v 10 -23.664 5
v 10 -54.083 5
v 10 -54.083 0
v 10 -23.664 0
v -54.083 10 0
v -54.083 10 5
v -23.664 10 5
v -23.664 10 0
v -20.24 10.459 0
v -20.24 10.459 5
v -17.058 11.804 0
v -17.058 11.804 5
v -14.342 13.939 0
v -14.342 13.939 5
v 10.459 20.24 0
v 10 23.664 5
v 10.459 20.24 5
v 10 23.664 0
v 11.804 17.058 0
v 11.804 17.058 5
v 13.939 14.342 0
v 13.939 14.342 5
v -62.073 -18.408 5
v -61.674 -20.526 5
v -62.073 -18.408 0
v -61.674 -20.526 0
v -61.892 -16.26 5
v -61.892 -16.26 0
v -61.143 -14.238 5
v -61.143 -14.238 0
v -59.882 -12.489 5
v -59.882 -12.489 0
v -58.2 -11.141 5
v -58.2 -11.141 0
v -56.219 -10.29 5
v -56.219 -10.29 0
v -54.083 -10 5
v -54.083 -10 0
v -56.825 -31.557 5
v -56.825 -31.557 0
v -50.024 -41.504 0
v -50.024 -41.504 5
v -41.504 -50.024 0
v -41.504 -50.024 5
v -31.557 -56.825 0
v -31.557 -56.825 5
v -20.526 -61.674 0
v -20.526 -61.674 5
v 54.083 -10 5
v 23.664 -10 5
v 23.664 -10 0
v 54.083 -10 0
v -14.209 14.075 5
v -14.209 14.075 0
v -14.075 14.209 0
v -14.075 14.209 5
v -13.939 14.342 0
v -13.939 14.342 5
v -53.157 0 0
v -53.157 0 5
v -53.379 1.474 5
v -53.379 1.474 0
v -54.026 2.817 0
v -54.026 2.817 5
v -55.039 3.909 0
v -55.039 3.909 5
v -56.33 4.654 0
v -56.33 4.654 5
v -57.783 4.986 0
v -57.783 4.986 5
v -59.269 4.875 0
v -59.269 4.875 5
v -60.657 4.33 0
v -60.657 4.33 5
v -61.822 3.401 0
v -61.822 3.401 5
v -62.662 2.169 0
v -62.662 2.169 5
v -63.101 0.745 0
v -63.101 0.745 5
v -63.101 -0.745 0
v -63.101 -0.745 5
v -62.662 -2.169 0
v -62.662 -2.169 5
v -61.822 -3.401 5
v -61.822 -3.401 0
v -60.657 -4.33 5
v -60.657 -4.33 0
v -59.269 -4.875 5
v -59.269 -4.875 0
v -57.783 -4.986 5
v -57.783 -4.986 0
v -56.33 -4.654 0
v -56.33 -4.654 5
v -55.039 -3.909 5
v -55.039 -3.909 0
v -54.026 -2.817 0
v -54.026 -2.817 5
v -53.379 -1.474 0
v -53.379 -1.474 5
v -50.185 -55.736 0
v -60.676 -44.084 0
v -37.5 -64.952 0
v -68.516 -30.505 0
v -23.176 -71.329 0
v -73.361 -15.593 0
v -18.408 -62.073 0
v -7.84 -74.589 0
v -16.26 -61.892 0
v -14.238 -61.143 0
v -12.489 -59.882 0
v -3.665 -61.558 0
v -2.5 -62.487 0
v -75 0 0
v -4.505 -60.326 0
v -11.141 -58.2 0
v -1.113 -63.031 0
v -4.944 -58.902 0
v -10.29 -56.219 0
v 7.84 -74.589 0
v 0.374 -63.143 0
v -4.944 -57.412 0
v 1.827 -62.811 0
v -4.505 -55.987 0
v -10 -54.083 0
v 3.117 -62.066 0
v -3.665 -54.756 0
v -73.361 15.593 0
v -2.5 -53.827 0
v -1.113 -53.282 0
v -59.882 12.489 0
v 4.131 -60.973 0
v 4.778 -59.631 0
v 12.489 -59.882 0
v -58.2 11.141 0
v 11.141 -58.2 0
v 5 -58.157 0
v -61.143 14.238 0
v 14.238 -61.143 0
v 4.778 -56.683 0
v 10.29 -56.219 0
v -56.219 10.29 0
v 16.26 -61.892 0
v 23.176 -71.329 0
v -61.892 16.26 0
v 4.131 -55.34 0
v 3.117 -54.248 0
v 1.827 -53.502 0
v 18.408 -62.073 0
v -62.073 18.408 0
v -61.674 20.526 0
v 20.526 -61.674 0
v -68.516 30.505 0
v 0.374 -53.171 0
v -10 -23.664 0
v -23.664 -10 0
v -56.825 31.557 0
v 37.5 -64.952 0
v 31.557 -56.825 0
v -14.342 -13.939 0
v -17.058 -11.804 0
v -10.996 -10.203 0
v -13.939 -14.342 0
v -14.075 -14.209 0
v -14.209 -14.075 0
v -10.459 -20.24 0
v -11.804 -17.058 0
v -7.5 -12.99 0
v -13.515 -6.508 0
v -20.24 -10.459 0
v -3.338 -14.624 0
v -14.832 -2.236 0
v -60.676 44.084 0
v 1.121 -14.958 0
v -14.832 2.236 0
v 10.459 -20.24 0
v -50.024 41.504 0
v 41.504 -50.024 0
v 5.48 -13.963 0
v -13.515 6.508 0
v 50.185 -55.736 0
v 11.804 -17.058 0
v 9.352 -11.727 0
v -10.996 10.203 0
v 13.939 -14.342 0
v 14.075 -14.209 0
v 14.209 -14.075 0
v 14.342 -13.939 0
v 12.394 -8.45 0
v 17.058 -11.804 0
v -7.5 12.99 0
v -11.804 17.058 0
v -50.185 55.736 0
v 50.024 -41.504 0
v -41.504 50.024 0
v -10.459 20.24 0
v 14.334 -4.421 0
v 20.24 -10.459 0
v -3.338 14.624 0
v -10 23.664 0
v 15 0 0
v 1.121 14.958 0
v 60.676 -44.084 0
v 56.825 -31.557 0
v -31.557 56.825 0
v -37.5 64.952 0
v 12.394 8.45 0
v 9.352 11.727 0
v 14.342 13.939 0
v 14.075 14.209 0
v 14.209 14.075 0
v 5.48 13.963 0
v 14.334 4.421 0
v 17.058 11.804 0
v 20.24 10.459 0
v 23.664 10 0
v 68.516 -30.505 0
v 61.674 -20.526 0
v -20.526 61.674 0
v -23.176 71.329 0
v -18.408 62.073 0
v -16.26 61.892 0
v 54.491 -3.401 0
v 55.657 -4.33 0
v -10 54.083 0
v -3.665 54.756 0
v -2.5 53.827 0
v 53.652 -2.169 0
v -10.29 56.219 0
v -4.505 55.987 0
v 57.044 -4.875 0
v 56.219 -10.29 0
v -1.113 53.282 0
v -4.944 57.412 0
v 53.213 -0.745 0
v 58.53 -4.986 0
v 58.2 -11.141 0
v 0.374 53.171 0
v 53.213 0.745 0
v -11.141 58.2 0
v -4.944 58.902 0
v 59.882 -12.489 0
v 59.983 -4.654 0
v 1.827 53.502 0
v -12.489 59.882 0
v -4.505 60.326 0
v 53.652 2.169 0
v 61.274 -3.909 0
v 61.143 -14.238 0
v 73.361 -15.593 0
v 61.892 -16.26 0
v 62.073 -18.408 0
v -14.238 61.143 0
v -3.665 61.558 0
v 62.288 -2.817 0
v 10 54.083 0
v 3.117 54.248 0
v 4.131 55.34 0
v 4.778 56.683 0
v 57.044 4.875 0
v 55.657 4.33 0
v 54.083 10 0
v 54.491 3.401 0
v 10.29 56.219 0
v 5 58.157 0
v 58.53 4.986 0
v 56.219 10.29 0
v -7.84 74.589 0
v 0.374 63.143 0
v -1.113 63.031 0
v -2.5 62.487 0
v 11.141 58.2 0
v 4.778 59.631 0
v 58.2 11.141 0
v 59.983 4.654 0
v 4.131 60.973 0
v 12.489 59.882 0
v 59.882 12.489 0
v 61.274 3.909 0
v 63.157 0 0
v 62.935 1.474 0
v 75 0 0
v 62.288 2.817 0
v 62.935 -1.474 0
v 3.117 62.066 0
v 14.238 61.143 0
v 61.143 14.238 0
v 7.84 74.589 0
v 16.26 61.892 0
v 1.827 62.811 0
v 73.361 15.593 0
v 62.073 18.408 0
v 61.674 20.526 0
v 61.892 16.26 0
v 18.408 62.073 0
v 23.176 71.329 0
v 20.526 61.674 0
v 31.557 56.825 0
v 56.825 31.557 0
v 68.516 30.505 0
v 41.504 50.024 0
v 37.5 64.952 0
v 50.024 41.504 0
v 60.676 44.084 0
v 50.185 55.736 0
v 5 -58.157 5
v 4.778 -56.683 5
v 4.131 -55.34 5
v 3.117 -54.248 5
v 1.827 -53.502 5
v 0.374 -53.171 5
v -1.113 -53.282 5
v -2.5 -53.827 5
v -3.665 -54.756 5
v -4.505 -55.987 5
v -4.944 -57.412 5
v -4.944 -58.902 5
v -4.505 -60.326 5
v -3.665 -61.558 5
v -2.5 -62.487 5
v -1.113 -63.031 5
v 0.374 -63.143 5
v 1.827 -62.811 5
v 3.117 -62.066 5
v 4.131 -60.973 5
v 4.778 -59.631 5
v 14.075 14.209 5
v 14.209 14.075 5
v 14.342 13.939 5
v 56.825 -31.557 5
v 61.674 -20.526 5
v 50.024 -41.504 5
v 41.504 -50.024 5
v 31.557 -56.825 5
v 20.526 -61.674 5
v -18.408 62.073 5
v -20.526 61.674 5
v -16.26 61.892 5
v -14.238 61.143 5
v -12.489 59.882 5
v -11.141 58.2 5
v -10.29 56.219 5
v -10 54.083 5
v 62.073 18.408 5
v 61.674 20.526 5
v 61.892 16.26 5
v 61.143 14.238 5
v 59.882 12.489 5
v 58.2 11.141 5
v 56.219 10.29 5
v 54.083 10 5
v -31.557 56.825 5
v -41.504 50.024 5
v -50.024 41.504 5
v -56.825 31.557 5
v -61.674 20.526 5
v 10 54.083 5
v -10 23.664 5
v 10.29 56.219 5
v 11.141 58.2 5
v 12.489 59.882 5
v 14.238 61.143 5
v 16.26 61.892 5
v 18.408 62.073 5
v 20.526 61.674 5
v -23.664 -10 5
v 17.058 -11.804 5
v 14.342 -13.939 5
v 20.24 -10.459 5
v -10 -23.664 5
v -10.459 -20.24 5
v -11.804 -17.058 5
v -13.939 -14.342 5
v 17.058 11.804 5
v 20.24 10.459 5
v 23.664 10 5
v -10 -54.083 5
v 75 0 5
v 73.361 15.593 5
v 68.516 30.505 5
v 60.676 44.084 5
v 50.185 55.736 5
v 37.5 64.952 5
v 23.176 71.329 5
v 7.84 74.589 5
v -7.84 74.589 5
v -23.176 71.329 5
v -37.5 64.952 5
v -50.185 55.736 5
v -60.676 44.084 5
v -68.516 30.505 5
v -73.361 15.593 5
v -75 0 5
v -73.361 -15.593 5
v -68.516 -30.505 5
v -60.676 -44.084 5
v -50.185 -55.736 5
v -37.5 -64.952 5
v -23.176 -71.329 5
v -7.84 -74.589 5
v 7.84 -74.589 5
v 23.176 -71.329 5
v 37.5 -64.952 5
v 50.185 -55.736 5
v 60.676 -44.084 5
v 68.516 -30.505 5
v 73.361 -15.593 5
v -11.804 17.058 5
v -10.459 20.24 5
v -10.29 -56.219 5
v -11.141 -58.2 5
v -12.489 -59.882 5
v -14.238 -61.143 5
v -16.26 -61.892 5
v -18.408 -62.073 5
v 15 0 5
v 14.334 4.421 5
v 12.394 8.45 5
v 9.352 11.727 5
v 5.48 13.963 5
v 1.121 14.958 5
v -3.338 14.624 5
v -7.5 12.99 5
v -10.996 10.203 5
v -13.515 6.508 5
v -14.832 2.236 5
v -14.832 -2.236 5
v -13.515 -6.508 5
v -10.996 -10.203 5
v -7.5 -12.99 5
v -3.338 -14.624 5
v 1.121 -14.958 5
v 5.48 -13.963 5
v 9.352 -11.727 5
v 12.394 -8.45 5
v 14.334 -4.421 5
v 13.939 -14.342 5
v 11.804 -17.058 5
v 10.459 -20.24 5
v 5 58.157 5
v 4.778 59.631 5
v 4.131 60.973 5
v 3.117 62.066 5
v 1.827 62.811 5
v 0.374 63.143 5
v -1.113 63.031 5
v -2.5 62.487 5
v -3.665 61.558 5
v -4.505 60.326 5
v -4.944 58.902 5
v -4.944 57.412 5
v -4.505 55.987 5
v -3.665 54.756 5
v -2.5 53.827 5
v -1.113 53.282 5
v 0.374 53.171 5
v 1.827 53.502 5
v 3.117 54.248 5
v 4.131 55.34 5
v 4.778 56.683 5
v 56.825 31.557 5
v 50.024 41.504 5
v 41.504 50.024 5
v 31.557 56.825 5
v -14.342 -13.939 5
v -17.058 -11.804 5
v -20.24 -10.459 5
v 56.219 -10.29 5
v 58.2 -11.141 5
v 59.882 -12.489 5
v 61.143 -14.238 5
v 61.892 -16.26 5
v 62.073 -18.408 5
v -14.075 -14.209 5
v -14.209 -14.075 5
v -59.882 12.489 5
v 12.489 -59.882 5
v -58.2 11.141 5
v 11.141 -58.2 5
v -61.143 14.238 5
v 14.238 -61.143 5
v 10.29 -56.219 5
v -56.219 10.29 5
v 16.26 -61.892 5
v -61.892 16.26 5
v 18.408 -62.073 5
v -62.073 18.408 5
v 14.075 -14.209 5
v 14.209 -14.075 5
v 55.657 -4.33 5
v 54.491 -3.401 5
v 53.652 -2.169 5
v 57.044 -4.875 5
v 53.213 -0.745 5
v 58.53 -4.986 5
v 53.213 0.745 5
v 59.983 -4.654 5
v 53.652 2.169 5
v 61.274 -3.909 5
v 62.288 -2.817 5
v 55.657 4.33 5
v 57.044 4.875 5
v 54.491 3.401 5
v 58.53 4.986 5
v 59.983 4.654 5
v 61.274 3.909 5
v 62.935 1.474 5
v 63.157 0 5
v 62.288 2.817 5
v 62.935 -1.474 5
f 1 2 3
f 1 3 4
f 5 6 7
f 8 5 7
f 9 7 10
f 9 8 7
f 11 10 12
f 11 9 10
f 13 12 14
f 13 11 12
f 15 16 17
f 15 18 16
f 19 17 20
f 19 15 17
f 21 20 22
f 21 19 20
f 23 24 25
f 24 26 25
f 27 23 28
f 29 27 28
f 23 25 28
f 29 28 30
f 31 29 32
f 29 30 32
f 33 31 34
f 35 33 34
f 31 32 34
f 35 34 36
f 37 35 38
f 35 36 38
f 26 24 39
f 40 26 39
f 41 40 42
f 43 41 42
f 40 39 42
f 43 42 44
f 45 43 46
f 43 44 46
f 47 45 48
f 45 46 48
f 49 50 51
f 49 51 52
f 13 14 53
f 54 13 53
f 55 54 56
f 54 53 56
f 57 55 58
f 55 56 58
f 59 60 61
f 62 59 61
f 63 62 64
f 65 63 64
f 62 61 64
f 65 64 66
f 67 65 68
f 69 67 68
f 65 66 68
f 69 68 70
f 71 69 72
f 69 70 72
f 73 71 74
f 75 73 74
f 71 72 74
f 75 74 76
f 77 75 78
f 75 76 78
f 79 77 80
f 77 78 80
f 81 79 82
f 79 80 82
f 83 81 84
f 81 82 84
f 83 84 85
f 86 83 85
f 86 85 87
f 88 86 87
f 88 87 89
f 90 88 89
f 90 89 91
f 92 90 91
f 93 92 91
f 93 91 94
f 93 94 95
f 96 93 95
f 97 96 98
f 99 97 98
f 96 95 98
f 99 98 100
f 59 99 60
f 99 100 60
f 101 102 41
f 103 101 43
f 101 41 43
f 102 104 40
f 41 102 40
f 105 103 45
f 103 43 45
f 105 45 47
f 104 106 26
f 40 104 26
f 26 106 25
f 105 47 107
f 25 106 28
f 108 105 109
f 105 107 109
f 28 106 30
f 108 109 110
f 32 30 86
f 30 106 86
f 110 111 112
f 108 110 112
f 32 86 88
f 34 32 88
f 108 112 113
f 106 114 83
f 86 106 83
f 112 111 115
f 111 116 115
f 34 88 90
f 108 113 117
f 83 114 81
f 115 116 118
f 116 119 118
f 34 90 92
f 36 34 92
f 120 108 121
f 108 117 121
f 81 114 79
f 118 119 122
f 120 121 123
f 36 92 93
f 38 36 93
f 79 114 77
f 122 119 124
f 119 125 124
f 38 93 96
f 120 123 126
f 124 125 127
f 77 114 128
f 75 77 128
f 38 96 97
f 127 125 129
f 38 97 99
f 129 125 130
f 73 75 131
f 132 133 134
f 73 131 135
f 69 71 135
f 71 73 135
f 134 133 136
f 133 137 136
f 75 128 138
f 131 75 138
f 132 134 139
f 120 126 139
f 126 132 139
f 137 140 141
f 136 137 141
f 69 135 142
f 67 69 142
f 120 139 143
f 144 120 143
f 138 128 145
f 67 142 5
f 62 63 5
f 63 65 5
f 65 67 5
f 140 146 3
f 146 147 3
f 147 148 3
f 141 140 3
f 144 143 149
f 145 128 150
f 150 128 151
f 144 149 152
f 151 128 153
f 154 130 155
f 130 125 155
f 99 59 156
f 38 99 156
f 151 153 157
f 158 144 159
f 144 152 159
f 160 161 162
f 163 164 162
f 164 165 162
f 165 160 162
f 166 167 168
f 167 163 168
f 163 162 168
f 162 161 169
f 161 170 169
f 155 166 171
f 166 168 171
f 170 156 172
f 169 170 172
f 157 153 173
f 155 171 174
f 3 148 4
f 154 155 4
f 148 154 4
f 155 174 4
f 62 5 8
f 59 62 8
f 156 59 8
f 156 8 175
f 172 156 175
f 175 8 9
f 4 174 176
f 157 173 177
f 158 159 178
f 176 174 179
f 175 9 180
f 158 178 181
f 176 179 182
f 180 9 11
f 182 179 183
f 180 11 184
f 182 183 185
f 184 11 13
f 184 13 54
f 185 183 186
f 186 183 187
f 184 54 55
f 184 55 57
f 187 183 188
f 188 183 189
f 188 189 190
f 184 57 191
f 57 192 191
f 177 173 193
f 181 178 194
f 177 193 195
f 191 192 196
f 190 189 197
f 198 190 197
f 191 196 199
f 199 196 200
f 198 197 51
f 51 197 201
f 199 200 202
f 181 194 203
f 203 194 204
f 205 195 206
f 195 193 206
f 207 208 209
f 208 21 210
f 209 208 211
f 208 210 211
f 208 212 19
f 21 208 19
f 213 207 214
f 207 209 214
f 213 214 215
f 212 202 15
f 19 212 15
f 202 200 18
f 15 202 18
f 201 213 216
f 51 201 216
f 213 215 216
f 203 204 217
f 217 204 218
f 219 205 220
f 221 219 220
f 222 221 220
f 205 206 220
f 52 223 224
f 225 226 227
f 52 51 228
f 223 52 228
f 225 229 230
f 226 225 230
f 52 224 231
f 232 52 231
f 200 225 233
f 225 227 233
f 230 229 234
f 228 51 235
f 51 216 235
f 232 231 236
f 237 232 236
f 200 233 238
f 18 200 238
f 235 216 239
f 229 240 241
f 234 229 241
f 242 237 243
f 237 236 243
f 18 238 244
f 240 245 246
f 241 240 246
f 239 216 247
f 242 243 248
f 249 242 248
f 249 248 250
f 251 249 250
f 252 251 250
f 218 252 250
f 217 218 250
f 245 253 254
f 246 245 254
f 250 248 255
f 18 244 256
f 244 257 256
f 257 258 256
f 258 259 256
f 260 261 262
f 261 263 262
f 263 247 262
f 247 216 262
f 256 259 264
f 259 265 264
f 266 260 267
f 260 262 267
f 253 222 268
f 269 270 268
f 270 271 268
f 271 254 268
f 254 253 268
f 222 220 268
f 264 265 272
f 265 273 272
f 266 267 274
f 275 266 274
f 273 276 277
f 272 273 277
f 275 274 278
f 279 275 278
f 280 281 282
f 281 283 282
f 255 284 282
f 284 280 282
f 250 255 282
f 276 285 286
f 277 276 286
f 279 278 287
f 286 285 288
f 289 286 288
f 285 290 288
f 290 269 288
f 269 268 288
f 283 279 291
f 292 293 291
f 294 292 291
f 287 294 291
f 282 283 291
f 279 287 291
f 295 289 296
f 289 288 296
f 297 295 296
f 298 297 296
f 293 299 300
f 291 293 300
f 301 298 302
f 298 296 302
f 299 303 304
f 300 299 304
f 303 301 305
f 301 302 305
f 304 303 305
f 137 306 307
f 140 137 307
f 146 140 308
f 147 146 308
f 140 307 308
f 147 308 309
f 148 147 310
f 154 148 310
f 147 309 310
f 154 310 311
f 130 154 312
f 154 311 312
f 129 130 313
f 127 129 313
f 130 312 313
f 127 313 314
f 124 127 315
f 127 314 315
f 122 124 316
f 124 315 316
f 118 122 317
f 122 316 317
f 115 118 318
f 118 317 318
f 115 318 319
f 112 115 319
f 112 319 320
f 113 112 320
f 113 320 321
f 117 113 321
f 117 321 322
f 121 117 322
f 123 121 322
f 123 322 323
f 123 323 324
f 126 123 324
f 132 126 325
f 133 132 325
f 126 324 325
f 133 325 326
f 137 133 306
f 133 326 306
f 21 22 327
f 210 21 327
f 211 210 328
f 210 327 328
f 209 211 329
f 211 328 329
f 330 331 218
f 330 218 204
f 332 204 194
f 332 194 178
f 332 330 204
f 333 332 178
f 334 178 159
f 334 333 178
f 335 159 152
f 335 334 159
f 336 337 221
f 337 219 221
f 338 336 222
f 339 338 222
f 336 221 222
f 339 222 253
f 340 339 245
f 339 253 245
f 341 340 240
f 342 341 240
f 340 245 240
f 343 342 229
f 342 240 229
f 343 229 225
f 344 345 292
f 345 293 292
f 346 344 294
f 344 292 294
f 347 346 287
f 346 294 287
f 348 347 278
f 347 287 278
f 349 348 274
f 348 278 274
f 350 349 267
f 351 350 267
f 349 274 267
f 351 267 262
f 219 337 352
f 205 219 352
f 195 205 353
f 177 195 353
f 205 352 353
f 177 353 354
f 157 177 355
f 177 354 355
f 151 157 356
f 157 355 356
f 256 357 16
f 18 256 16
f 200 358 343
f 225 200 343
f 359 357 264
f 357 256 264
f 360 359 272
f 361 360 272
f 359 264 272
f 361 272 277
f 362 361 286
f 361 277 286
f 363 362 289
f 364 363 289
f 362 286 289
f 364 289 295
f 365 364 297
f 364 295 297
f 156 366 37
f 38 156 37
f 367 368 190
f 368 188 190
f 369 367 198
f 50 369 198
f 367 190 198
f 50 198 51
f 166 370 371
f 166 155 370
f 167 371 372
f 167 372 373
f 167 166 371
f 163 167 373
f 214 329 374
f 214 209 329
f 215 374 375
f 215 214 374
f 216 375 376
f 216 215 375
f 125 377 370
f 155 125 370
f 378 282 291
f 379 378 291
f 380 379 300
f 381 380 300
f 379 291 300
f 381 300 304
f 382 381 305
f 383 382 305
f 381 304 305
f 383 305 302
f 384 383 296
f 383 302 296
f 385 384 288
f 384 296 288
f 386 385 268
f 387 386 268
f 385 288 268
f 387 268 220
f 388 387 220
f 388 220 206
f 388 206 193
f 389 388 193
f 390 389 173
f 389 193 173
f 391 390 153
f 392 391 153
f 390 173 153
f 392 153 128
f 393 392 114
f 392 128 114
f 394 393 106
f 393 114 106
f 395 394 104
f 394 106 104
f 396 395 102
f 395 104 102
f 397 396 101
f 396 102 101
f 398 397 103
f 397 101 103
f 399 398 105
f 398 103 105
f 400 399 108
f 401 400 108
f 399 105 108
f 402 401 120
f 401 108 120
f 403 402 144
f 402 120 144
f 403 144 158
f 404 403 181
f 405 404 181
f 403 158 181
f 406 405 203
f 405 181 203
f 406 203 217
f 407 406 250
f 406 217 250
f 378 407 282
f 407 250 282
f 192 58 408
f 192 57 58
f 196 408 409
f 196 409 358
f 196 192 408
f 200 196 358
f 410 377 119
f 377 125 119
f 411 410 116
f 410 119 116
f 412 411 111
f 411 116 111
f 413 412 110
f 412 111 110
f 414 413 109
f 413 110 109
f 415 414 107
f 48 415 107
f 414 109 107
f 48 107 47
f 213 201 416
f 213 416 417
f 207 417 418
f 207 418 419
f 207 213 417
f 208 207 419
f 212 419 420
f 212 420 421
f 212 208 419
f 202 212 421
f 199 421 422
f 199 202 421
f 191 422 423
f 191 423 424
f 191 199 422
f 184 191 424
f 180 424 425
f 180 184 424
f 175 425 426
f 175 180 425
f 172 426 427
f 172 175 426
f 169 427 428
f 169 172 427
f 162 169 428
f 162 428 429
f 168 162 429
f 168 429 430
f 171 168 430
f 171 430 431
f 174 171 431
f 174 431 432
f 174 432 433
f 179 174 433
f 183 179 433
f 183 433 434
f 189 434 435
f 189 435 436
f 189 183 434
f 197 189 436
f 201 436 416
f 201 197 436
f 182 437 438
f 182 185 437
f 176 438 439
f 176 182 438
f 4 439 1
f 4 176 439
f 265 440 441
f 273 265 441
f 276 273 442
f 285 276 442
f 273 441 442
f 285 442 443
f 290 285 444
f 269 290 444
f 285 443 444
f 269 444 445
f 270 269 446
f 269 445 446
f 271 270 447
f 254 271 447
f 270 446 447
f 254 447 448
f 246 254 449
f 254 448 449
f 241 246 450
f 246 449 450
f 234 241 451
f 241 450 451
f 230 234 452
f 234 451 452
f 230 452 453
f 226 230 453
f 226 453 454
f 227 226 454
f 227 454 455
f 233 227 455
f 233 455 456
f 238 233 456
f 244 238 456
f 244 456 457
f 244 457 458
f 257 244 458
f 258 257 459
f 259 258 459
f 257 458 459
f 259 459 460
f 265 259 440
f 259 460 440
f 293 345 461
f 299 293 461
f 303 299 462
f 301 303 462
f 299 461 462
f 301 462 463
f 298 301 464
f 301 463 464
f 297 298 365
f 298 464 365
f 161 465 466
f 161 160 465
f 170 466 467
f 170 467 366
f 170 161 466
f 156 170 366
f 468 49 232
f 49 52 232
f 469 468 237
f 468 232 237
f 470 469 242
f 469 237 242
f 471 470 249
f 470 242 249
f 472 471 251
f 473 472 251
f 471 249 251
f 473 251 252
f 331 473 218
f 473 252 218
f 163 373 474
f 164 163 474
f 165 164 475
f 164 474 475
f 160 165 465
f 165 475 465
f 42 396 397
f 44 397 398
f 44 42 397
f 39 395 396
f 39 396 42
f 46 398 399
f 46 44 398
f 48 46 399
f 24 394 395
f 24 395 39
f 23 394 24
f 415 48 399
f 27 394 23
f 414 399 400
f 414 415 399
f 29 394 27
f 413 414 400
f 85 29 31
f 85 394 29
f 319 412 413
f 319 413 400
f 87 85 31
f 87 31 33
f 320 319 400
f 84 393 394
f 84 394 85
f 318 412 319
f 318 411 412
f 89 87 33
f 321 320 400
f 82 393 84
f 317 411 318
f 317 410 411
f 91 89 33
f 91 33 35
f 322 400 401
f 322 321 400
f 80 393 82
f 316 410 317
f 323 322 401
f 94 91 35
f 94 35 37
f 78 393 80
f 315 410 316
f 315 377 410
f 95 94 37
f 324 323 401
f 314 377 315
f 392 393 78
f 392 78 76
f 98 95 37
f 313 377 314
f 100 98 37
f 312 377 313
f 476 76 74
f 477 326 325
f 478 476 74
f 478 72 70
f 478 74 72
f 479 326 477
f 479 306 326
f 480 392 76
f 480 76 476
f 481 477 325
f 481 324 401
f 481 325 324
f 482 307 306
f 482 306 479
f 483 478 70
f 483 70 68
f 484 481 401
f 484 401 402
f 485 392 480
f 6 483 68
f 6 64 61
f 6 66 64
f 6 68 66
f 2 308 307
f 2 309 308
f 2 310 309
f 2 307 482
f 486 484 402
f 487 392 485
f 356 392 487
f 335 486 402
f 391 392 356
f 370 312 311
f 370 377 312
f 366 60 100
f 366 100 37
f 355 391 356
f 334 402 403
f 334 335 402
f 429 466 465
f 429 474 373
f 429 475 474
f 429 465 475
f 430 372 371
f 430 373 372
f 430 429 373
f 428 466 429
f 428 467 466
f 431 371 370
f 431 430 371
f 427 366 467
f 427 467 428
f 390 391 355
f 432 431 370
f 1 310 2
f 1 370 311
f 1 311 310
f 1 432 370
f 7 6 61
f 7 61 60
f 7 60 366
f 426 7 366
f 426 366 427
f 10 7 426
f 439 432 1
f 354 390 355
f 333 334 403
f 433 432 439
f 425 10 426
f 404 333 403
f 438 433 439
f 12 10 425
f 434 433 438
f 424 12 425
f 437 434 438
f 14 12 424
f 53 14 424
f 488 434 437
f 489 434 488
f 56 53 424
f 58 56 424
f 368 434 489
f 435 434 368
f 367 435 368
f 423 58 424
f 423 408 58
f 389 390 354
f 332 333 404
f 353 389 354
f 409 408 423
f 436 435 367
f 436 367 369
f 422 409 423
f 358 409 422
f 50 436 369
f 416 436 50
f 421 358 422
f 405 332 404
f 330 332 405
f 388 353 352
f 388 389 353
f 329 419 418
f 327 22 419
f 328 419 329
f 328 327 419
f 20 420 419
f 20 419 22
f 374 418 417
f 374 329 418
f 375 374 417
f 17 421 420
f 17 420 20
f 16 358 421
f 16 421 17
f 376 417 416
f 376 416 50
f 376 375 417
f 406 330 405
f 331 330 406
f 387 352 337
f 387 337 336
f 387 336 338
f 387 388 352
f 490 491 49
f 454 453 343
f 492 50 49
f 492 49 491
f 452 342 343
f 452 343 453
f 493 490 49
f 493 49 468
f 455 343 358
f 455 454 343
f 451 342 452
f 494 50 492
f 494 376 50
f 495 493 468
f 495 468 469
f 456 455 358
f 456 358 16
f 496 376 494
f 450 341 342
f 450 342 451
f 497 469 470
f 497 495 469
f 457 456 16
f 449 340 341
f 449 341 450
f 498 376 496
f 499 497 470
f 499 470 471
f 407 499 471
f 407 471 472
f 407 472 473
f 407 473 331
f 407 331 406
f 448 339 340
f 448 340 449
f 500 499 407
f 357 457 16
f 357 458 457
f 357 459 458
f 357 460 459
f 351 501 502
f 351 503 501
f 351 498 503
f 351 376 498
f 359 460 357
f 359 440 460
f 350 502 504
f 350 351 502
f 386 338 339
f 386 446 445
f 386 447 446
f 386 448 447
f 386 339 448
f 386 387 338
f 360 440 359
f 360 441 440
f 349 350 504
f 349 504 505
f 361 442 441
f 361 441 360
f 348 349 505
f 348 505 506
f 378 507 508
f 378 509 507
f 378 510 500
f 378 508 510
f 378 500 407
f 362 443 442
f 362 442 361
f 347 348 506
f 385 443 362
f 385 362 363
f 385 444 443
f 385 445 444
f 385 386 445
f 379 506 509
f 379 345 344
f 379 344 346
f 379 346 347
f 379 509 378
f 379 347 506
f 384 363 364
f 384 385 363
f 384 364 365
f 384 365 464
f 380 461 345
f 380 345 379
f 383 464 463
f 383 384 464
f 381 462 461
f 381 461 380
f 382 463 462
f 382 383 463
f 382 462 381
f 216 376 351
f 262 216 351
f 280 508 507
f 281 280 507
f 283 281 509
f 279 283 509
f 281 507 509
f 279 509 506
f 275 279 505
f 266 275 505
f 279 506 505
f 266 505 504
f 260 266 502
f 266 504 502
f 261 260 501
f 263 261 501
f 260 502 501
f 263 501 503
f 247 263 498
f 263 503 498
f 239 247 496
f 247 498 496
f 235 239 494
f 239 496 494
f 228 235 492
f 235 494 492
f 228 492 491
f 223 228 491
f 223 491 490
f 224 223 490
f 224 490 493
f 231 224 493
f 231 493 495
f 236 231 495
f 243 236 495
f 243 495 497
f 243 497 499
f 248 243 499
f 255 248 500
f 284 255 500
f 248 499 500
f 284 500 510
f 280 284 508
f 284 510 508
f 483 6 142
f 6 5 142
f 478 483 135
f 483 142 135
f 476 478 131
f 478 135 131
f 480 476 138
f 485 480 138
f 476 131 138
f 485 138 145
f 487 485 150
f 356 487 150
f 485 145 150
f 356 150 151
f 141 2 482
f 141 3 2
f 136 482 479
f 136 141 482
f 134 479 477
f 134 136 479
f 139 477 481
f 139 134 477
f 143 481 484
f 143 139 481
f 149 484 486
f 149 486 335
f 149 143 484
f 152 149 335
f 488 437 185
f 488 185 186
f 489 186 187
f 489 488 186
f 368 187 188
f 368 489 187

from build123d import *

# Parameters (mm, degrees)
SKETCH1_R           = 75
SKETCH1_R_2         = 15
BOSS_EXTRUDE1_DEPTH = 5
SKETCH2_R           = 5
CUT_EXTRUDE1_DEPTH  = 5
CUT_EXTRUDE2_DEPTH  = 5
FILLET1_R           = 13
FILLET2_R           = 8


with BuildPart() as part:
    # Sketch1 → Boss-Extrude1 (new body)
    with BuildSketch(Plane.XY):
        Circle(SKETCH1_R)
        Circle(SKETCH1_R_2, mode=Mode.SUBTRACT)
    extrude(amount=BOSS_EXTRUDE1_DEPTH)

    # Sketch2 → Cut-Extrude1 (cut)
    with BuildSketch(Plane.XY.offset(5)):
        with BuildLine():
            Line((-10, -64.226162893), (-10, -17.320508076))
            ThreePointArc((-10, -17.320508076), (-14.142135624, -14.142135624), (-17.320508076, -10))
            Line((-17.320508076, -10), (-64.226162893, -10))
            ThreePointArc((-64.226162893, -10), (-45.961940777, -45.961940777), (-10, -64.226162893))
        make_face()
        with BuildLine():
            ThreePointArc((10, 17.320508076), (14.142135624, 14.142135624), (17.320508076, 10))
            Line((17.320508076, 10), (64.226162893, 10))
            ThreePointArc((64.226162893, 10), (45.961940777, 45.961940777), (10, 64.226162893))
            Line((10, 64.226162893), (10, 17.320508076))
        make_face()
        with BuildLine():
            Line((-64.226162893, 10), (-17.320508076, 10))
            ThreePointArc((-17.320508076, 10), (-14.142135624, 14.142135624), (-10, 17.320508076))
            Line((-10, 17.320508076), (-10, 64.226162893))
            ThreePointArc((-10, 64.226162893), (-45.961940777, 45.961940777), (-64.226162893, 10))
        make_face()
        with Locations((58.156758338, 0)):
            Circle(SKETCH2_R)
        with Locations((0, -58.156758338)):
            Circle(SKETCH2_R)
        with Locations((-58.156758338, 0)):
            Circle(SKETCH2_R)
        with Locations((0, 58.156758338)):
            Circle(SKETCH2_R)
    extrude(amount=-CUT_EXTRUDE1_DEPTH, mode=Mode.SUBTRACT)

    # Sketch2<3> → Cut-Extrude2 (cut)
    with BuildSketch(Plane.XY.offset(5)):
        with BuildLine():
            ThreePointArc((17.320508076, -10), (14.142135624, -14.142135624), (10, -17.320508076))
            Line((10, -17.320508076), (10, -64.226162893))
            ThreePointArc((10, -64.226162893), (45.961940777, -45.961940777), (64.226162893, -10))
            Line((64.226162893, -10), (17.320508076, -10))
        make_face()
    extrude(amount=-CUT_EXTRUDE2_DEPTH, mode=Mode.SUBTRACT)

    # Fillet1
    fillet1_edges = [part.edges().sort_by_distance(p)[0] for p in [
        (10, -17.320508076, 2.5),
        (17.320508076, -10, 2.5),
        (17.320508076, 10, 2.5),
        (10, 17.320508076, 2.5),
        (-10, 17.320508076, 2.5),
        (-17.320508076, 10, 2.5),
        (-10, -17.320508076, 2.5),
        (-17.320508076, -10, 2.5),
    ]]
    fillet(fillet1_edges, radius=FILLET1_R)

    # Fillet2
    fillet2_edges = [part.edges().sort_by_distance(p)[0] for p in [
        (-64.226162893, -10, 2.5),
        (-10, -64.226162893, 2.5),
        (-64.226162893, 10, 2.5),
        (10, -64.226162893, 2.5),
        (64.226162893, -10, 2.5),
        (-10, 64.226162893, 2.5),
        (10, 64.226162893, 2.5),
        (64.226162893, 10, 2.5),
    ]]
    fillet(fillet2_edges, radius=FILLET2_R)


solid = part.part
